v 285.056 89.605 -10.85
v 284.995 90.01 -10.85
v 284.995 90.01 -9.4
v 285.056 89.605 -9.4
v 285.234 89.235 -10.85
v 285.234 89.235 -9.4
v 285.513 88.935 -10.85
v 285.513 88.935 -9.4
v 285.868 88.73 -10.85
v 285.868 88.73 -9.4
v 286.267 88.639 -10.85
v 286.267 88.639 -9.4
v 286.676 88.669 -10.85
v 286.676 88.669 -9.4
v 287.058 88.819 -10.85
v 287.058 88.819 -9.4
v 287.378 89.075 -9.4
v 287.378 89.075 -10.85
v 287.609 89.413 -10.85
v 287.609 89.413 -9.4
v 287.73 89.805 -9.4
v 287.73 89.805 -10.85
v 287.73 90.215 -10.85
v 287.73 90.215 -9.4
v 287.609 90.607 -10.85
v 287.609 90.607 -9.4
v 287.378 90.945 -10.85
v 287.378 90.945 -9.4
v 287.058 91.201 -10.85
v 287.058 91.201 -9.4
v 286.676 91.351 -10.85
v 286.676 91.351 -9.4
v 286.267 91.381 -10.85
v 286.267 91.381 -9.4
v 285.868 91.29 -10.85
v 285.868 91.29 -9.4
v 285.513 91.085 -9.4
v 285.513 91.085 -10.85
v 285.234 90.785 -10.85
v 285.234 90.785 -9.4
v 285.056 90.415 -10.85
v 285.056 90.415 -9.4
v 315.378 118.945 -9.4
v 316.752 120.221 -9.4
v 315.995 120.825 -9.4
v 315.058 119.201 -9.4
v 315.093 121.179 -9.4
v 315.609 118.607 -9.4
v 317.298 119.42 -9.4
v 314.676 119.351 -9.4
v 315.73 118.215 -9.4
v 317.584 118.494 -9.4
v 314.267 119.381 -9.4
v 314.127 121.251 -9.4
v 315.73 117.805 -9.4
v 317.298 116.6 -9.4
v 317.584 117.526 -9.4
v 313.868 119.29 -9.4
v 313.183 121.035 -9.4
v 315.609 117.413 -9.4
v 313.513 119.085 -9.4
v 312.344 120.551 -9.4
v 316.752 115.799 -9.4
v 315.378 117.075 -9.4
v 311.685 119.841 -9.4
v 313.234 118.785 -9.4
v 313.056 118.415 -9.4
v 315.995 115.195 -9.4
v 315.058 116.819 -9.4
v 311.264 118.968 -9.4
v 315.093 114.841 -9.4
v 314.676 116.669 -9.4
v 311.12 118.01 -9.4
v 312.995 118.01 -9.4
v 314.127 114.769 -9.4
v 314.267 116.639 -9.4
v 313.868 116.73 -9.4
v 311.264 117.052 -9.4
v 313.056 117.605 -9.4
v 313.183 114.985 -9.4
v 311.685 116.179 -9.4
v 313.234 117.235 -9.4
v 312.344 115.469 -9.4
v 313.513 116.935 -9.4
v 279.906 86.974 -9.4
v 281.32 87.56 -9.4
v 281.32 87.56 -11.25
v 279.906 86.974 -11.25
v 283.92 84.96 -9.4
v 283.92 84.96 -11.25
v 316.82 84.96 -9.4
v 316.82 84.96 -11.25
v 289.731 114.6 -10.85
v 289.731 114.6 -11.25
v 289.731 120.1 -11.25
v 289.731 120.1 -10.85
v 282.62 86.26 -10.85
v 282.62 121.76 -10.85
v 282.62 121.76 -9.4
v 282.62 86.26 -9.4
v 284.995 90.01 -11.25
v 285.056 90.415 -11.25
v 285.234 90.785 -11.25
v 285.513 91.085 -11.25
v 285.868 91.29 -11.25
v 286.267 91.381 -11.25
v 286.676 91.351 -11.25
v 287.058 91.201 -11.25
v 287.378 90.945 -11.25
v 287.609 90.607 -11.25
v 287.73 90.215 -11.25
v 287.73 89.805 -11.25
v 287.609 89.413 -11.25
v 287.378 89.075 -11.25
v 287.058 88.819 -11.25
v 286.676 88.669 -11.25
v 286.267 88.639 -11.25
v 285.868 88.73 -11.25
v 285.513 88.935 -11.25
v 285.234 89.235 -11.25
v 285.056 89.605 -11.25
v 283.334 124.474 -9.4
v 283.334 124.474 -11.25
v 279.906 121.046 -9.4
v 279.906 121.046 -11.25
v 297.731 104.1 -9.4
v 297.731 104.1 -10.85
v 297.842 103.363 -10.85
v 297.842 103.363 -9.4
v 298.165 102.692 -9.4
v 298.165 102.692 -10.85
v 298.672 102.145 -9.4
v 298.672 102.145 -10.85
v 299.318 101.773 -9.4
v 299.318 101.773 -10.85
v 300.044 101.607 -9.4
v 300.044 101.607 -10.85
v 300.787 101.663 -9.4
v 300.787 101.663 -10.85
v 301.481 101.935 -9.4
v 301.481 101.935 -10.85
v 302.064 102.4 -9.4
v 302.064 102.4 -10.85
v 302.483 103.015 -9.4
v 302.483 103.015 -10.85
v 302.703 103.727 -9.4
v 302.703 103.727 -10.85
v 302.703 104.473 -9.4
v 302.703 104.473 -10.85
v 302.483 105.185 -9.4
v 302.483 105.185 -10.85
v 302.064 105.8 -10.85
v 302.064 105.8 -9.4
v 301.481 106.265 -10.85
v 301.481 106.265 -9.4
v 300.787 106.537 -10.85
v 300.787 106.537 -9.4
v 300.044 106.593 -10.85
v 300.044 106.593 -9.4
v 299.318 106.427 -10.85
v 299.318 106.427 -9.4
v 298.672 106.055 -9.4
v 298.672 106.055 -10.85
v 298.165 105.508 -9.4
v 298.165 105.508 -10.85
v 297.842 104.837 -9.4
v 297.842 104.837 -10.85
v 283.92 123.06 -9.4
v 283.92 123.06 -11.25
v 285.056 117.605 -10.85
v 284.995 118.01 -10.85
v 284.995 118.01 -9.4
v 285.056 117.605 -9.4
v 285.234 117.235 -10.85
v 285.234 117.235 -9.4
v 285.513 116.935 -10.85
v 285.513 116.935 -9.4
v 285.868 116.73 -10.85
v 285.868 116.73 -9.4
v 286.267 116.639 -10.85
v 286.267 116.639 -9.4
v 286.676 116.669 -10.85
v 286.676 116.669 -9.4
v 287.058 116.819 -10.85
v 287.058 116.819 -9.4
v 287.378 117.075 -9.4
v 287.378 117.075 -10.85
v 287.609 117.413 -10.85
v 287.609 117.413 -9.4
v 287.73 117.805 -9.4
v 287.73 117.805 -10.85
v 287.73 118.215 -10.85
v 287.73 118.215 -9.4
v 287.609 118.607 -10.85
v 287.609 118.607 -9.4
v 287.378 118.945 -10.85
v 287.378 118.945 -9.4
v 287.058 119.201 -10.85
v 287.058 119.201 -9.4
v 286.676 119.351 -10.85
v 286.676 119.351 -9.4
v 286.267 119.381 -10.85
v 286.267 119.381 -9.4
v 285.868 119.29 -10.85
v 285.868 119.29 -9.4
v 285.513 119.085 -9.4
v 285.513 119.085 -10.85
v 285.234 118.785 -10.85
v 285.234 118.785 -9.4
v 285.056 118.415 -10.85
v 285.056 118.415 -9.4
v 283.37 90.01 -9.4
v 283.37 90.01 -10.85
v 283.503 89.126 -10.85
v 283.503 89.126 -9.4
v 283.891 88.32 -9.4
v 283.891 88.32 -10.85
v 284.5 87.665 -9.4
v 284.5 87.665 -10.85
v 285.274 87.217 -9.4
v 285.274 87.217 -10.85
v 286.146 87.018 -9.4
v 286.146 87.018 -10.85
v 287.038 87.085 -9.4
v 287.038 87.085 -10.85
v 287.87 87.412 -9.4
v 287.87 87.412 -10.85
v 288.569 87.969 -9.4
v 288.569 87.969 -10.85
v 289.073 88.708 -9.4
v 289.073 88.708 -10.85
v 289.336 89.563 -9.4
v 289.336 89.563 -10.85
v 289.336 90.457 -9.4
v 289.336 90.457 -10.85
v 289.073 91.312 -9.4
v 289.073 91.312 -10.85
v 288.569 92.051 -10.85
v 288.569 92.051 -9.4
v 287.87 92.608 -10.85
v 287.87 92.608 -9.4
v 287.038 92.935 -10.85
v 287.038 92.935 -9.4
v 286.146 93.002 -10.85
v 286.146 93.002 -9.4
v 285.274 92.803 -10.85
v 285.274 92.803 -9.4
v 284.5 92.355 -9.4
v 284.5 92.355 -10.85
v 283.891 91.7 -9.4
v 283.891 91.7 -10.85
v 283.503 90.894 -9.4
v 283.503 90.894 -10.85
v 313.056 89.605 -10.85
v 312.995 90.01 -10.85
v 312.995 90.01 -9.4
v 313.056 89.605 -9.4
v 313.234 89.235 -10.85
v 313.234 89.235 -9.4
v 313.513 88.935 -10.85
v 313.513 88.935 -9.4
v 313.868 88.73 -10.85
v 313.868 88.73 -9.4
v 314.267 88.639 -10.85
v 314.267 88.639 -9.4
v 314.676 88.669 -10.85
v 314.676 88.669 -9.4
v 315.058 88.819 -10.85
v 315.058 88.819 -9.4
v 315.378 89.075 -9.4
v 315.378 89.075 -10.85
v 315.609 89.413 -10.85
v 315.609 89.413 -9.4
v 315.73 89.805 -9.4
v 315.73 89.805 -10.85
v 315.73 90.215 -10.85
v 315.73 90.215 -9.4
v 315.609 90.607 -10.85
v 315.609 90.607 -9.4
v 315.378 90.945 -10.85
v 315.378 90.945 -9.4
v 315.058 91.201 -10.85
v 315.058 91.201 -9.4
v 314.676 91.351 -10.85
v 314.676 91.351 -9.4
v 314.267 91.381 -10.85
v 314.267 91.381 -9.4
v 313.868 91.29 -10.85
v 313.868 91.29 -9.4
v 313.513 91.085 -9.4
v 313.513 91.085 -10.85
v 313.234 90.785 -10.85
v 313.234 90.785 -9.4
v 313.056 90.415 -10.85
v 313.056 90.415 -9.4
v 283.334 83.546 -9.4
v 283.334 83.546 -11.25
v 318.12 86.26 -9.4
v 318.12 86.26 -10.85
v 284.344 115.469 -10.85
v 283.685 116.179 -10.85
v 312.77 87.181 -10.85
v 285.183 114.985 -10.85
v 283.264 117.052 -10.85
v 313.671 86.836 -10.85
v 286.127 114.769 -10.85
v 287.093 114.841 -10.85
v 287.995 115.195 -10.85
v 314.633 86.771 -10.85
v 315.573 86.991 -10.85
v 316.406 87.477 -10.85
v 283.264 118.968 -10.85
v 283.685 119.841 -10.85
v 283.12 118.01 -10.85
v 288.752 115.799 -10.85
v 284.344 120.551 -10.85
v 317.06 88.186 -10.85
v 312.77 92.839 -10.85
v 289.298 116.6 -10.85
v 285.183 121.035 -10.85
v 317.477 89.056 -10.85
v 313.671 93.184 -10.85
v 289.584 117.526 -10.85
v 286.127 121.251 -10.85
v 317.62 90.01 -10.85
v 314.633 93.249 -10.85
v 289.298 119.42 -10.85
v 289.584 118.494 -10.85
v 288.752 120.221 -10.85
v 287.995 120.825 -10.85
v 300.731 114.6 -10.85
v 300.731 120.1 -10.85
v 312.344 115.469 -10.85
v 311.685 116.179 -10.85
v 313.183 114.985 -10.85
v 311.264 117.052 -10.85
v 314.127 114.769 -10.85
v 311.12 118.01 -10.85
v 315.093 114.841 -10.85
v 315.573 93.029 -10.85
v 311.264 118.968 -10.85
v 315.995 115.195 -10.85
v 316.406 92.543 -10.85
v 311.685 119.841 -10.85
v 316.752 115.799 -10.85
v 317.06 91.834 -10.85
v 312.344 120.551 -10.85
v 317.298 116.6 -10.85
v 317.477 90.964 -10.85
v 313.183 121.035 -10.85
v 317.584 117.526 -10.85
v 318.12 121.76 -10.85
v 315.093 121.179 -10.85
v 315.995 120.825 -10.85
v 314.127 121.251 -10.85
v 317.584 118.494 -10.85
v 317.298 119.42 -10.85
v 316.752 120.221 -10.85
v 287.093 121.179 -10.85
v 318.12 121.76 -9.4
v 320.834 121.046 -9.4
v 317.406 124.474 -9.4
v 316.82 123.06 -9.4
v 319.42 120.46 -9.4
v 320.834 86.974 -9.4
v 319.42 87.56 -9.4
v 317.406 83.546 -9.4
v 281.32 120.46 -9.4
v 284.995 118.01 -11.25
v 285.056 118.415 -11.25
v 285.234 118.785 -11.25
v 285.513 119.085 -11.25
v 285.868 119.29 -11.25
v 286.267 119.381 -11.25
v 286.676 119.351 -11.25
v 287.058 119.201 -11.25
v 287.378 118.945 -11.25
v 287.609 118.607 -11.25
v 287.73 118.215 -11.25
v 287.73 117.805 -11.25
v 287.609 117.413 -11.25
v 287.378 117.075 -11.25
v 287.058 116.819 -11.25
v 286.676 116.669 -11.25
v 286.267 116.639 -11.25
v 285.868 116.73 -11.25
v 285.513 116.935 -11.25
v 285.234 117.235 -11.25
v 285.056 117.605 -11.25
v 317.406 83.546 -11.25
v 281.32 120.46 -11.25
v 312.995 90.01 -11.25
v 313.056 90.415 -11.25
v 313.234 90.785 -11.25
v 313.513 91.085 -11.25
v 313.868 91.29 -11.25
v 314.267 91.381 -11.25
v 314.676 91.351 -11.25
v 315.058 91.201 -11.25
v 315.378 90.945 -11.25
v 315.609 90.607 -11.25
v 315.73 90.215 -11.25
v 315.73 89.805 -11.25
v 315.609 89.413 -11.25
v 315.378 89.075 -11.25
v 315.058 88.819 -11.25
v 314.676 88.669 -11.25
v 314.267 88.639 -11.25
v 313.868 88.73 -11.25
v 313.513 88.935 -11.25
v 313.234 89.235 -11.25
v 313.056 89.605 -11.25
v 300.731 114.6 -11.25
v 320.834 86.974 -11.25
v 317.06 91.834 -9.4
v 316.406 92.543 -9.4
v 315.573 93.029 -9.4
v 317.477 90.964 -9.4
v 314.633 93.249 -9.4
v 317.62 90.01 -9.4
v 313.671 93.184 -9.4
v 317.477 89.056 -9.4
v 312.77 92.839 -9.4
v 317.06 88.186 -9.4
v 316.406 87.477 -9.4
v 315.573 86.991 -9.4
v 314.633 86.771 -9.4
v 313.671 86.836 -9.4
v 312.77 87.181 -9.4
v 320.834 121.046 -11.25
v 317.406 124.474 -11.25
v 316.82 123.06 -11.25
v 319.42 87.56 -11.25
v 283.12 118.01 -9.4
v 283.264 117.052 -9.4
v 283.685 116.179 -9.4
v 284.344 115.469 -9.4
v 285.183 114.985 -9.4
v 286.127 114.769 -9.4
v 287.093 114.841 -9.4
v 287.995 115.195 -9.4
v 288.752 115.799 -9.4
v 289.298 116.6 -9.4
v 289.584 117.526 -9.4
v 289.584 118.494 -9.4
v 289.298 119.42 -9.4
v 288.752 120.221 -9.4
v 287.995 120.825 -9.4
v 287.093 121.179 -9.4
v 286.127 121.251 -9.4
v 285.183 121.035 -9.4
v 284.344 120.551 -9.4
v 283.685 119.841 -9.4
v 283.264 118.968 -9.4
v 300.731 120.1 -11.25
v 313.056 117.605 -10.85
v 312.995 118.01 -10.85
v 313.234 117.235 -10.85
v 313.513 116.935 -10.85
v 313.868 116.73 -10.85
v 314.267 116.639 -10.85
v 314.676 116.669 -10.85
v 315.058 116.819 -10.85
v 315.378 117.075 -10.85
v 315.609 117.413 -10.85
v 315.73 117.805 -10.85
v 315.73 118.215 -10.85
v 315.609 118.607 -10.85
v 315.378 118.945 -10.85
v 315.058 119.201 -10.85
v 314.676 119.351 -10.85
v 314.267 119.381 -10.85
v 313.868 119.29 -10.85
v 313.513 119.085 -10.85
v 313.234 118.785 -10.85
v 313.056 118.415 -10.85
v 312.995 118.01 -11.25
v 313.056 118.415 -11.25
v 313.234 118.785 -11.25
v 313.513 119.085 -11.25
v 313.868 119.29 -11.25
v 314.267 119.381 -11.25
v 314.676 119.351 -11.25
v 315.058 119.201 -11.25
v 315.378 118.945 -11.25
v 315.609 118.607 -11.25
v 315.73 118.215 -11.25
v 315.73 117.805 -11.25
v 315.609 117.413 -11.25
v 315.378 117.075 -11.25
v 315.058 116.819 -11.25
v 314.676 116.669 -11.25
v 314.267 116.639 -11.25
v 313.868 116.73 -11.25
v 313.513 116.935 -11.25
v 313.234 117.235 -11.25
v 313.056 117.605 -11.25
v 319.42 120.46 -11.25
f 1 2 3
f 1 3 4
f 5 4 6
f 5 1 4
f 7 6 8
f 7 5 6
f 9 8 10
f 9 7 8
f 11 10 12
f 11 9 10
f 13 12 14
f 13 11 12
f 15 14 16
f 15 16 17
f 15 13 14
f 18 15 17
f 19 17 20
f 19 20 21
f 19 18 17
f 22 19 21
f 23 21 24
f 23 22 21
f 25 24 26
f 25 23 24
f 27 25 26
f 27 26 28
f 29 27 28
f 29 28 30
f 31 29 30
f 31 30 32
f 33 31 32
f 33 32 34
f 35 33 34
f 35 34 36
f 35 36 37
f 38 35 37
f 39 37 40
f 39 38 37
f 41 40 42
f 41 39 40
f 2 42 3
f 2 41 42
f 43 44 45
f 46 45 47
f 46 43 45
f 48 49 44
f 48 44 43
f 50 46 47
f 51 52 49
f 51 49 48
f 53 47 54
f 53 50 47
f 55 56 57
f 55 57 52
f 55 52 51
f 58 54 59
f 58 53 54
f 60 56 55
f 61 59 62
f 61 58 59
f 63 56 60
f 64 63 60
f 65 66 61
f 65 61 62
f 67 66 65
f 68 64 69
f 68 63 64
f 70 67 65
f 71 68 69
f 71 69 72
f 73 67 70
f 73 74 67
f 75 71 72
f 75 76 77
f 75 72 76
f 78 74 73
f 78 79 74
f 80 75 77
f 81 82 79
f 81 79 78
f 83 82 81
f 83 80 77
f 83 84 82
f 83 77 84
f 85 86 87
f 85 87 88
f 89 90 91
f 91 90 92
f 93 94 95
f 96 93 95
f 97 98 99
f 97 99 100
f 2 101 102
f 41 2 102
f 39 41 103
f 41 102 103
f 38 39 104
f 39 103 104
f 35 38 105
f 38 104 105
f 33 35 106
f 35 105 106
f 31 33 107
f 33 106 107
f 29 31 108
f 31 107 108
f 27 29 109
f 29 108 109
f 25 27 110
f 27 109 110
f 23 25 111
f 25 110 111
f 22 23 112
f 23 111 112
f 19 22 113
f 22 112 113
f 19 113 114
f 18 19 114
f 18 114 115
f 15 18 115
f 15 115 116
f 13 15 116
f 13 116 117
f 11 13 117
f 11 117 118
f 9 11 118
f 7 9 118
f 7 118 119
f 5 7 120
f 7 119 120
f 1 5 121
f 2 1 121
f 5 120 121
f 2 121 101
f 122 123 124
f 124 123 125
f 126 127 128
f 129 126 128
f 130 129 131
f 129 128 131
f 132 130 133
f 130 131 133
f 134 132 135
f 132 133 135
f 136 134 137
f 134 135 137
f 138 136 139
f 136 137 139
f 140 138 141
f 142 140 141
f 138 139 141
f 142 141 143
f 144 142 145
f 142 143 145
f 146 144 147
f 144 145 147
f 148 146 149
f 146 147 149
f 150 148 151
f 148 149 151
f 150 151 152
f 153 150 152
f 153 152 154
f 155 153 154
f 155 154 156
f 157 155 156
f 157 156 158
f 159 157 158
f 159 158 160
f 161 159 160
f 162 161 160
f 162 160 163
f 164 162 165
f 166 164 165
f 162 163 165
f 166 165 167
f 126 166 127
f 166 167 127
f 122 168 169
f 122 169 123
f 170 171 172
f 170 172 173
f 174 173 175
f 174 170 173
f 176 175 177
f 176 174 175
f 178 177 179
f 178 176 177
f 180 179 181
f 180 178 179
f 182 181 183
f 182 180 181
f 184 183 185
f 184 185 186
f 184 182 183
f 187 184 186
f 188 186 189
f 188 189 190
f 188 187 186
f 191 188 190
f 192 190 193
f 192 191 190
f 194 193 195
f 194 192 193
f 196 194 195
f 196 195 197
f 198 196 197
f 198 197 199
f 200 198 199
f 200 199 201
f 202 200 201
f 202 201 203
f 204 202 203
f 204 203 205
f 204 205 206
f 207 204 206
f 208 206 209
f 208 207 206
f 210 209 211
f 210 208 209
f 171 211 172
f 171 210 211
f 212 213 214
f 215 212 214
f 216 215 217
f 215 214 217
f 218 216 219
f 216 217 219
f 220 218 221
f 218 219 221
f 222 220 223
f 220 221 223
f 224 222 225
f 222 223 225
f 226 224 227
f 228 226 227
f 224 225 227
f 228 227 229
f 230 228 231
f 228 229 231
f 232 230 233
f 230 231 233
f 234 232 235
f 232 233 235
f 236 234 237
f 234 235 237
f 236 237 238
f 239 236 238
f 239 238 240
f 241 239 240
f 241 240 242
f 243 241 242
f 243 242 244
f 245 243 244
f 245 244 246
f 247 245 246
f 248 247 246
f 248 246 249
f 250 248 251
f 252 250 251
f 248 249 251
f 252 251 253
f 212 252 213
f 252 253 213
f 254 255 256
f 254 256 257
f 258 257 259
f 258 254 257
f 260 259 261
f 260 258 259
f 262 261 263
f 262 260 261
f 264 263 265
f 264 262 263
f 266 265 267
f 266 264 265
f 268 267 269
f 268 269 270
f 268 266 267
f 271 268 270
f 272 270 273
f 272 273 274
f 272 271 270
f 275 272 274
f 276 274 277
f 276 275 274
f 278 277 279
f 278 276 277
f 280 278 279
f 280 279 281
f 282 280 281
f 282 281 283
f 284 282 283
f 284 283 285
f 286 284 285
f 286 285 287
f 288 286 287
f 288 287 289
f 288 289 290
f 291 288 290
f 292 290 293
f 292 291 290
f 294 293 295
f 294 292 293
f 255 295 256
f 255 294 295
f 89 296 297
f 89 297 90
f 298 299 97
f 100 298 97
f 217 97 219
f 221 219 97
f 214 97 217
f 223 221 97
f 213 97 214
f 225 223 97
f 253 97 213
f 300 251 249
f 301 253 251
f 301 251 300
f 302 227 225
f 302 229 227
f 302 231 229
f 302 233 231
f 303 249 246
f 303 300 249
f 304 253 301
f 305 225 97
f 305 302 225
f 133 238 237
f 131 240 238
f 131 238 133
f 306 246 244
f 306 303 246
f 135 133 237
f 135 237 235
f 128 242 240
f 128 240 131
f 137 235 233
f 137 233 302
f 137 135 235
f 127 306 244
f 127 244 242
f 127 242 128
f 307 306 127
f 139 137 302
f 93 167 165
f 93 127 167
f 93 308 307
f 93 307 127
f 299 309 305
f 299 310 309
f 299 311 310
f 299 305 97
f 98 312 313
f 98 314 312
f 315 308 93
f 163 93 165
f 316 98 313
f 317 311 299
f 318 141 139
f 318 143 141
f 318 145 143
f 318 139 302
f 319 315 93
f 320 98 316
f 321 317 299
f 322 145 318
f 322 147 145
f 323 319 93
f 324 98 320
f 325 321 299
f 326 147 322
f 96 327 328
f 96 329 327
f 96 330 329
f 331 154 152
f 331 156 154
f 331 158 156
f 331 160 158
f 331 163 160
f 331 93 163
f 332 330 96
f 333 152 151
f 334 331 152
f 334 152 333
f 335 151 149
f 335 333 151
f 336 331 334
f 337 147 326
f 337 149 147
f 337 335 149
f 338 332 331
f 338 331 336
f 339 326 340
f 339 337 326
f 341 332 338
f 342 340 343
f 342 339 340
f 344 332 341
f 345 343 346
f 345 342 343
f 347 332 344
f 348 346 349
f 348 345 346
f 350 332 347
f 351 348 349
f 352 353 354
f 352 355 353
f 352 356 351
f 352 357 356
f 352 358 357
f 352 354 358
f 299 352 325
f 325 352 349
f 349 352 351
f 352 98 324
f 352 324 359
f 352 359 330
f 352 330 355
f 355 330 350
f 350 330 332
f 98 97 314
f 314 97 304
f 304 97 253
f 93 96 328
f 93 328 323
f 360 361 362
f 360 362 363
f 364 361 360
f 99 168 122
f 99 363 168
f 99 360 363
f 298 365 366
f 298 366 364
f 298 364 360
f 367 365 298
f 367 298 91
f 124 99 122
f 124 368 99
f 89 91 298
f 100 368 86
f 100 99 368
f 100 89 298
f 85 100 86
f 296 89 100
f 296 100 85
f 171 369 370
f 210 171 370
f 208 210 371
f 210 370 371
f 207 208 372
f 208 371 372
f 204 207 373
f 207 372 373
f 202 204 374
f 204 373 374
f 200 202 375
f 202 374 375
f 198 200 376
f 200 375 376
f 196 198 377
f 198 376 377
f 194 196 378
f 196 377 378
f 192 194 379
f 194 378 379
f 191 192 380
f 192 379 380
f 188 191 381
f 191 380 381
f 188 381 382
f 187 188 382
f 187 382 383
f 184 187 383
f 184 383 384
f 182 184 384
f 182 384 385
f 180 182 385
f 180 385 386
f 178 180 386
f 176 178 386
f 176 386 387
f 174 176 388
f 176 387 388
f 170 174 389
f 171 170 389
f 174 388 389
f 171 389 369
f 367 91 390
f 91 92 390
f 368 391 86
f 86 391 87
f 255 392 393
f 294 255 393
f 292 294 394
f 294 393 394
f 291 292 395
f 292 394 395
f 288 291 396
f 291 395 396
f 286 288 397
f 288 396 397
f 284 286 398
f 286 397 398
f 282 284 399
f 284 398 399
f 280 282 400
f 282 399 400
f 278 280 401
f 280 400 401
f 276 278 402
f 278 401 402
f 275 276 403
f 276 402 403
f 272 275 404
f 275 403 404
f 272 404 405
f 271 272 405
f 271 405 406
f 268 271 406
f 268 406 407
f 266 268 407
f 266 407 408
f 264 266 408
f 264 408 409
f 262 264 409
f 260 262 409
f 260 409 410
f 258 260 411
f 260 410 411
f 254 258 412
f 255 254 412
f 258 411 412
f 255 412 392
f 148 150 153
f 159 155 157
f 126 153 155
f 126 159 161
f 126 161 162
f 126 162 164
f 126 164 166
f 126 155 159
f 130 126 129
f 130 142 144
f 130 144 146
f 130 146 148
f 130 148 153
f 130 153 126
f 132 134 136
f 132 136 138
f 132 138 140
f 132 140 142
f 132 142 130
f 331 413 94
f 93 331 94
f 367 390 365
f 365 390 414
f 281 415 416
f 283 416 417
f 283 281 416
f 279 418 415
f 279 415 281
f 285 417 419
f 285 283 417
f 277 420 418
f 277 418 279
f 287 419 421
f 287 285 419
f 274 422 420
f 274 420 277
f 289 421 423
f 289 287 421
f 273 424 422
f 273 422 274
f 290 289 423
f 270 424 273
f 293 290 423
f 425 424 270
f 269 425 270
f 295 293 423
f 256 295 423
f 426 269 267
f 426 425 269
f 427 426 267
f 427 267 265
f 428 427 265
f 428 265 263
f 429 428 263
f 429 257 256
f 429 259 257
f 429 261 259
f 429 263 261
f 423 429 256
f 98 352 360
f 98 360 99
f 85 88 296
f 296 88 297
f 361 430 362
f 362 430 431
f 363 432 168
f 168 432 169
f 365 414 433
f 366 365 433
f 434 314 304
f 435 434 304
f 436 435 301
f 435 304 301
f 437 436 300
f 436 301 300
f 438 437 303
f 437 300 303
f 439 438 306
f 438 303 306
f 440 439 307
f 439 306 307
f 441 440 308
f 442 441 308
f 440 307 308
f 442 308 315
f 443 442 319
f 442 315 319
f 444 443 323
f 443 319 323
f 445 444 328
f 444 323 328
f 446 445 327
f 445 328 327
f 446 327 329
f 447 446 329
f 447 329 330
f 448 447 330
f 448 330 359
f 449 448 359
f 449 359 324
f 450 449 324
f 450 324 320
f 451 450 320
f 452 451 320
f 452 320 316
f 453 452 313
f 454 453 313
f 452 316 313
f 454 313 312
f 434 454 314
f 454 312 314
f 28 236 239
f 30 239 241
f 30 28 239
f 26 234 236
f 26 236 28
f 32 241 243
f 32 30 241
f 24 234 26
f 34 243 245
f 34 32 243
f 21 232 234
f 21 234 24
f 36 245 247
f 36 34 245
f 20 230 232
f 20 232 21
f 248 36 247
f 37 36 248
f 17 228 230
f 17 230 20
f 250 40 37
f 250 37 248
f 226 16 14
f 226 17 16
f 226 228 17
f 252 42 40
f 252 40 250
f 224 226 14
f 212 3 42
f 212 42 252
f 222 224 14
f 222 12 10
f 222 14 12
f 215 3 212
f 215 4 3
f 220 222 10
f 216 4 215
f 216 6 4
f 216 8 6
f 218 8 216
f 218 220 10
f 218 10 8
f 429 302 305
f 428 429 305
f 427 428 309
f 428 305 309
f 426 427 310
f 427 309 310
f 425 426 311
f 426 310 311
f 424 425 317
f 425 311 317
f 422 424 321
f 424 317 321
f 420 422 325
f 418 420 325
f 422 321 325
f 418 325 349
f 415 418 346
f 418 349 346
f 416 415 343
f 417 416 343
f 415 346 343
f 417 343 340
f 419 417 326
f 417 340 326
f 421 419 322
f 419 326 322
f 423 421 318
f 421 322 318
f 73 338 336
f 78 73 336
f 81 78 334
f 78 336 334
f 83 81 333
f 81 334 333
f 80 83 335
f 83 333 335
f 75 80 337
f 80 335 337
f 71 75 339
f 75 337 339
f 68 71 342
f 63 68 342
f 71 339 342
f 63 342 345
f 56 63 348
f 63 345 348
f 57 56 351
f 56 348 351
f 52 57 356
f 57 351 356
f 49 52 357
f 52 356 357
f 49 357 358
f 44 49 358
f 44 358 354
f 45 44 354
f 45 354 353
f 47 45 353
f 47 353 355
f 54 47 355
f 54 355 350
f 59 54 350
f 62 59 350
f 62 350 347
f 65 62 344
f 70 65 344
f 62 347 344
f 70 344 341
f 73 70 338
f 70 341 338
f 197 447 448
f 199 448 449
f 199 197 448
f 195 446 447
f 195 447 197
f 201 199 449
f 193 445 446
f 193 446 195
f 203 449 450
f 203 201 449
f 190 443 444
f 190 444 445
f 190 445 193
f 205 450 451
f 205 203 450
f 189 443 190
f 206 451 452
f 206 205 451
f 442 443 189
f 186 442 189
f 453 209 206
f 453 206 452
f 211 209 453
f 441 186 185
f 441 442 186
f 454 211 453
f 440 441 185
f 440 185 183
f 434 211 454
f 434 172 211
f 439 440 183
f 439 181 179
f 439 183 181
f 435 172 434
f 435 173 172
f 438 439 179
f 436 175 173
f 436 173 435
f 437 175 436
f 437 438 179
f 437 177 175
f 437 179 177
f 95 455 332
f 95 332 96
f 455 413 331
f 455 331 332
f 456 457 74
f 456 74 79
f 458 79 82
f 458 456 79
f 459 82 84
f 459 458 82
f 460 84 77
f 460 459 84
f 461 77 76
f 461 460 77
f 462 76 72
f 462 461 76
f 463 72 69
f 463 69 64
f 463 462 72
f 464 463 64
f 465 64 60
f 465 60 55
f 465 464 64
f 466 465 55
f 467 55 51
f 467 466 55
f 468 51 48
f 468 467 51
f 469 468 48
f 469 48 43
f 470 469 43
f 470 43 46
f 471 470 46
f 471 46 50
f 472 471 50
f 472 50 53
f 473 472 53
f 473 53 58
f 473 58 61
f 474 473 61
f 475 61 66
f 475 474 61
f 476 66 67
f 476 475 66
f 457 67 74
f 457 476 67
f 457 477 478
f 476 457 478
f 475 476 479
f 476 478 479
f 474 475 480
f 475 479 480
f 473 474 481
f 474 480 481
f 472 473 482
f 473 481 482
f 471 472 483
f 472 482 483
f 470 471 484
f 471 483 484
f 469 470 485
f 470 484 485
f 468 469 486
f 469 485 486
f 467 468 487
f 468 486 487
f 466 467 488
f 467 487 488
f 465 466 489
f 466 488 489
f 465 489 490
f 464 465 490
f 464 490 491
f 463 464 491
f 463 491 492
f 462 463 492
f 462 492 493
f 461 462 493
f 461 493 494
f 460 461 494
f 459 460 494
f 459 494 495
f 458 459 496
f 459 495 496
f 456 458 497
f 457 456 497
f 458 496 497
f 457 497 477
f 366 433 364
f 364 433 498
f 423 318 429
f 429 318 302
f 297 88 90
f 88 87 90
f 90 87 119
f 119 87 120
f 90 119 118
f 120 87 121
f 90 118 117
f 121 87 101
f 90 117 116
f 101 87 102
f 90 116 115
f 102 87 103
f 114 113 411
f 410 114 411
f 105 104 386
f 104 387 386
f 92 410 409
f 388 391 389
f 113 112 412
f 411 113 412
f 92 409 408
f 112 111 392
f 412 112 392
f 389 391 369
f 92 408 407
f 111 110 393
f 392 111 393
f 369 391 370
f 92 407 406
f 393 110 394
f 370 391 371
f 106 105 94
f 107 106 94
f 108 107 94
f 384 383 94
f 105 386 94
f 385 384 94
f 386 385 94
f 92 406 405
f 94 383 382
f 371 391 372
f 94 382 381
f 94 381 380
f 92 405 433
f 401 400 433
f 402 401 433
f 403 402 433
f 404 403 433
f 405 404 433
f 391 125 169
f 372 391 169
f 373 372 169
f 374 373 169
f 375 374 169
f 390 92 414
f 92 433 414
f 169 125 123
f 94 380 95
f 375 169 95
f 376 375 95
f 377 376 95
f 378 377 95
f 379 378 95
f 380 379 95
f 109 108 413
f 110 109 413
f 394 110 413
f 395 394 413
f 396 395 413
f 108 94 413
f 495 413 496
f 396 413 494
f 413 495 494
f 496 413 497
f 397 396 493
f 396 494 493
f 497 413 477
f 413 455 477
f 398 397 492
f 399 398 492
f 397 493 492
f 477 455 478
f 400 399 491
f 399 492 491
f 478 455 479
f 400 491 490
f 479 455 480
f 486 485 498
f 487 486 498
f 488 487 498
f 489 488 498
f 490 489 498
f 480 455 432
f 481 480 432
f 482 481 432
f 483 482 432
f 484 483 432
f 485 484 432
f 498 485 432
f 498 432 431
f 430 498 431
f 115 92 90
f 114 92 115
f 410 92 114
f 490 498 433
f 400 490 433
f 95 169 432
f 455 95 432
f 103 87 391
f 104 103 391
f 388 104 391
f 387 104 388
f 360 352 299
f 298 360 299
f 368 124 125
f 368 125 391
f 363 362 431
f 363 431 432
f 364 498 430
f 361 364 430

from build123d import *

# Parameters (mm, degrees)
SKETCH_R      = 1.375
SKETCH_W      = 11
SKETCH_H      = 5.5
PAD_DEPTH     = 0.4
SKETCH001_W   = 35.5
SKETCH001_H   = 35.5
PAD001_DEPTH  = 1.45
SKETCH002_R   = 3.25
SKETCH002_R_2 = 1.375
SKETCH002_R_3 = 3
SKETCH002_R_4 = 2.5
PAD002_DEPTH  = 1.45


with BuildPart() as part:
    # Sketch (on DatumPlane) → Pad (new body)
    with BuildSketch(Plane(origin=(300.2309, 104.1, -11.25), x_dir=(-1, 0, 0), z_dir=(0, 0, -1))):
        Polygon((20.325114, -17.125786), (16.896686, -20.554214), (16.3109, -19.14), (-16.5891, -19.14), (-17.174886, -20.554214), (-20.603314, -17.125786), (-19.1891, -16.54), (-19.1891, 16.36), (-20.603314, 16.945786), (-17.174886, 20.374214), (-16.5891, 18.96), (16.3109, 18.96), (16.896686, 20.374214), (20.325114, 16.945786), (18.9109, 16.36), (18.9109, -16.54), align=None)
        with Locations((-14.1391, 13.91)):
            Circle(SKETCH_R, mode=Mode.SUBTRACT)
        with Locations((13.8609, 13.91)):
            Circle(SKETCH_R, mode=Mode.SUBTRACT)
        with Locations((13.8609, -14.09)):
            Circle(SKETCH_R, mode=Mode.SUBTRACT)
        with Locations((-14.1391, -14.09)):
            Circle(SKETCH_R, mode=Mode.SUBTRACT)
        with Locations((5, 13.25)):
            Rectangle(SKETCH_W, SKETCH_H, mode=Mode.SUBTRACT)
    extrude(amount=-PAD_DEPTH)

    # Sketch001 (on DatumPlane) → Pad001 (join)
    with BuildSketch(Plane(origin=(300.2309, 104.1, -10.85), x_dir=(-1, 0, 0), z_dir=(0, 0, 1))):
        Polygon((16.3109, -18.96), (16.896686, -20.374214), (20.325114, -16.945786), (18.9109, -16.36), (18.9109, 16.54), (20.325114, 17.125786), (16.896686, 20.554214), (16.3109, 19.14), (-16.5891, 19.14), (-17.174886, 20.554214), (-20.603314, 17.125786), (-19.1891, 16.54), (-19.1891, -16.36), (-20.603314, -16.945786), (-17.174886, -20.374214), (-16.5891, -18.96), align=None)
        with Locations((-0.1391, 0.09)):
            Rectangle(SKETCH001_W, SKETCH001_H, mode=Mode.SUBTRACT)
    extrude(amount=PAD001_DEPTH)

    # Sketch002 (on DatumPlane) → Pad002 (join)
    with BuildSketch(Plane(origin=(300.2309, 104.1, -10.85), x_dir=(-1, 0, 0), z_dir=(0, 0, 1))):
        with Locations((-14.1391, -13.91)):
            Circle(SKETCH002_R)
        with Locations((-14.1391, -13.91)):
            Circle(SKETCH002_R_2, mode=Mode.SUBTRACT)
        with Locations((13.8609, 14.09)):
            Circle(SKETCH002_R_3)
        with Locations((13.8609, 14.09)):
            Circle(SKETCH002_R_2, mode=Mode.SUBTRACT)
        with Locations((13.8609, -13.91)):
            Circle(SKETCH002_R)
        with Locations((13.8609, -13.91)):
            Circle(SKETCH002_R_2, mode=Mode.SUBTRACT)
        Circle(SKETCH002_R_4)
        with BuildLine():
            ThreePointArc((-12.5391, 16.918869), (-17.3891, 14.09), (-12.5391, 11.261131))
            Line((-12.5391, 11.261131), (-12.5391, 16.918869))
        make_face()
        with Locations((-14.1391, 14.09)):
            Circle(SKETCH002_R_2, mode=Mode.SUBTRACT)
    extrude(amount=PAD002_DEPTH)


solid = part.part
